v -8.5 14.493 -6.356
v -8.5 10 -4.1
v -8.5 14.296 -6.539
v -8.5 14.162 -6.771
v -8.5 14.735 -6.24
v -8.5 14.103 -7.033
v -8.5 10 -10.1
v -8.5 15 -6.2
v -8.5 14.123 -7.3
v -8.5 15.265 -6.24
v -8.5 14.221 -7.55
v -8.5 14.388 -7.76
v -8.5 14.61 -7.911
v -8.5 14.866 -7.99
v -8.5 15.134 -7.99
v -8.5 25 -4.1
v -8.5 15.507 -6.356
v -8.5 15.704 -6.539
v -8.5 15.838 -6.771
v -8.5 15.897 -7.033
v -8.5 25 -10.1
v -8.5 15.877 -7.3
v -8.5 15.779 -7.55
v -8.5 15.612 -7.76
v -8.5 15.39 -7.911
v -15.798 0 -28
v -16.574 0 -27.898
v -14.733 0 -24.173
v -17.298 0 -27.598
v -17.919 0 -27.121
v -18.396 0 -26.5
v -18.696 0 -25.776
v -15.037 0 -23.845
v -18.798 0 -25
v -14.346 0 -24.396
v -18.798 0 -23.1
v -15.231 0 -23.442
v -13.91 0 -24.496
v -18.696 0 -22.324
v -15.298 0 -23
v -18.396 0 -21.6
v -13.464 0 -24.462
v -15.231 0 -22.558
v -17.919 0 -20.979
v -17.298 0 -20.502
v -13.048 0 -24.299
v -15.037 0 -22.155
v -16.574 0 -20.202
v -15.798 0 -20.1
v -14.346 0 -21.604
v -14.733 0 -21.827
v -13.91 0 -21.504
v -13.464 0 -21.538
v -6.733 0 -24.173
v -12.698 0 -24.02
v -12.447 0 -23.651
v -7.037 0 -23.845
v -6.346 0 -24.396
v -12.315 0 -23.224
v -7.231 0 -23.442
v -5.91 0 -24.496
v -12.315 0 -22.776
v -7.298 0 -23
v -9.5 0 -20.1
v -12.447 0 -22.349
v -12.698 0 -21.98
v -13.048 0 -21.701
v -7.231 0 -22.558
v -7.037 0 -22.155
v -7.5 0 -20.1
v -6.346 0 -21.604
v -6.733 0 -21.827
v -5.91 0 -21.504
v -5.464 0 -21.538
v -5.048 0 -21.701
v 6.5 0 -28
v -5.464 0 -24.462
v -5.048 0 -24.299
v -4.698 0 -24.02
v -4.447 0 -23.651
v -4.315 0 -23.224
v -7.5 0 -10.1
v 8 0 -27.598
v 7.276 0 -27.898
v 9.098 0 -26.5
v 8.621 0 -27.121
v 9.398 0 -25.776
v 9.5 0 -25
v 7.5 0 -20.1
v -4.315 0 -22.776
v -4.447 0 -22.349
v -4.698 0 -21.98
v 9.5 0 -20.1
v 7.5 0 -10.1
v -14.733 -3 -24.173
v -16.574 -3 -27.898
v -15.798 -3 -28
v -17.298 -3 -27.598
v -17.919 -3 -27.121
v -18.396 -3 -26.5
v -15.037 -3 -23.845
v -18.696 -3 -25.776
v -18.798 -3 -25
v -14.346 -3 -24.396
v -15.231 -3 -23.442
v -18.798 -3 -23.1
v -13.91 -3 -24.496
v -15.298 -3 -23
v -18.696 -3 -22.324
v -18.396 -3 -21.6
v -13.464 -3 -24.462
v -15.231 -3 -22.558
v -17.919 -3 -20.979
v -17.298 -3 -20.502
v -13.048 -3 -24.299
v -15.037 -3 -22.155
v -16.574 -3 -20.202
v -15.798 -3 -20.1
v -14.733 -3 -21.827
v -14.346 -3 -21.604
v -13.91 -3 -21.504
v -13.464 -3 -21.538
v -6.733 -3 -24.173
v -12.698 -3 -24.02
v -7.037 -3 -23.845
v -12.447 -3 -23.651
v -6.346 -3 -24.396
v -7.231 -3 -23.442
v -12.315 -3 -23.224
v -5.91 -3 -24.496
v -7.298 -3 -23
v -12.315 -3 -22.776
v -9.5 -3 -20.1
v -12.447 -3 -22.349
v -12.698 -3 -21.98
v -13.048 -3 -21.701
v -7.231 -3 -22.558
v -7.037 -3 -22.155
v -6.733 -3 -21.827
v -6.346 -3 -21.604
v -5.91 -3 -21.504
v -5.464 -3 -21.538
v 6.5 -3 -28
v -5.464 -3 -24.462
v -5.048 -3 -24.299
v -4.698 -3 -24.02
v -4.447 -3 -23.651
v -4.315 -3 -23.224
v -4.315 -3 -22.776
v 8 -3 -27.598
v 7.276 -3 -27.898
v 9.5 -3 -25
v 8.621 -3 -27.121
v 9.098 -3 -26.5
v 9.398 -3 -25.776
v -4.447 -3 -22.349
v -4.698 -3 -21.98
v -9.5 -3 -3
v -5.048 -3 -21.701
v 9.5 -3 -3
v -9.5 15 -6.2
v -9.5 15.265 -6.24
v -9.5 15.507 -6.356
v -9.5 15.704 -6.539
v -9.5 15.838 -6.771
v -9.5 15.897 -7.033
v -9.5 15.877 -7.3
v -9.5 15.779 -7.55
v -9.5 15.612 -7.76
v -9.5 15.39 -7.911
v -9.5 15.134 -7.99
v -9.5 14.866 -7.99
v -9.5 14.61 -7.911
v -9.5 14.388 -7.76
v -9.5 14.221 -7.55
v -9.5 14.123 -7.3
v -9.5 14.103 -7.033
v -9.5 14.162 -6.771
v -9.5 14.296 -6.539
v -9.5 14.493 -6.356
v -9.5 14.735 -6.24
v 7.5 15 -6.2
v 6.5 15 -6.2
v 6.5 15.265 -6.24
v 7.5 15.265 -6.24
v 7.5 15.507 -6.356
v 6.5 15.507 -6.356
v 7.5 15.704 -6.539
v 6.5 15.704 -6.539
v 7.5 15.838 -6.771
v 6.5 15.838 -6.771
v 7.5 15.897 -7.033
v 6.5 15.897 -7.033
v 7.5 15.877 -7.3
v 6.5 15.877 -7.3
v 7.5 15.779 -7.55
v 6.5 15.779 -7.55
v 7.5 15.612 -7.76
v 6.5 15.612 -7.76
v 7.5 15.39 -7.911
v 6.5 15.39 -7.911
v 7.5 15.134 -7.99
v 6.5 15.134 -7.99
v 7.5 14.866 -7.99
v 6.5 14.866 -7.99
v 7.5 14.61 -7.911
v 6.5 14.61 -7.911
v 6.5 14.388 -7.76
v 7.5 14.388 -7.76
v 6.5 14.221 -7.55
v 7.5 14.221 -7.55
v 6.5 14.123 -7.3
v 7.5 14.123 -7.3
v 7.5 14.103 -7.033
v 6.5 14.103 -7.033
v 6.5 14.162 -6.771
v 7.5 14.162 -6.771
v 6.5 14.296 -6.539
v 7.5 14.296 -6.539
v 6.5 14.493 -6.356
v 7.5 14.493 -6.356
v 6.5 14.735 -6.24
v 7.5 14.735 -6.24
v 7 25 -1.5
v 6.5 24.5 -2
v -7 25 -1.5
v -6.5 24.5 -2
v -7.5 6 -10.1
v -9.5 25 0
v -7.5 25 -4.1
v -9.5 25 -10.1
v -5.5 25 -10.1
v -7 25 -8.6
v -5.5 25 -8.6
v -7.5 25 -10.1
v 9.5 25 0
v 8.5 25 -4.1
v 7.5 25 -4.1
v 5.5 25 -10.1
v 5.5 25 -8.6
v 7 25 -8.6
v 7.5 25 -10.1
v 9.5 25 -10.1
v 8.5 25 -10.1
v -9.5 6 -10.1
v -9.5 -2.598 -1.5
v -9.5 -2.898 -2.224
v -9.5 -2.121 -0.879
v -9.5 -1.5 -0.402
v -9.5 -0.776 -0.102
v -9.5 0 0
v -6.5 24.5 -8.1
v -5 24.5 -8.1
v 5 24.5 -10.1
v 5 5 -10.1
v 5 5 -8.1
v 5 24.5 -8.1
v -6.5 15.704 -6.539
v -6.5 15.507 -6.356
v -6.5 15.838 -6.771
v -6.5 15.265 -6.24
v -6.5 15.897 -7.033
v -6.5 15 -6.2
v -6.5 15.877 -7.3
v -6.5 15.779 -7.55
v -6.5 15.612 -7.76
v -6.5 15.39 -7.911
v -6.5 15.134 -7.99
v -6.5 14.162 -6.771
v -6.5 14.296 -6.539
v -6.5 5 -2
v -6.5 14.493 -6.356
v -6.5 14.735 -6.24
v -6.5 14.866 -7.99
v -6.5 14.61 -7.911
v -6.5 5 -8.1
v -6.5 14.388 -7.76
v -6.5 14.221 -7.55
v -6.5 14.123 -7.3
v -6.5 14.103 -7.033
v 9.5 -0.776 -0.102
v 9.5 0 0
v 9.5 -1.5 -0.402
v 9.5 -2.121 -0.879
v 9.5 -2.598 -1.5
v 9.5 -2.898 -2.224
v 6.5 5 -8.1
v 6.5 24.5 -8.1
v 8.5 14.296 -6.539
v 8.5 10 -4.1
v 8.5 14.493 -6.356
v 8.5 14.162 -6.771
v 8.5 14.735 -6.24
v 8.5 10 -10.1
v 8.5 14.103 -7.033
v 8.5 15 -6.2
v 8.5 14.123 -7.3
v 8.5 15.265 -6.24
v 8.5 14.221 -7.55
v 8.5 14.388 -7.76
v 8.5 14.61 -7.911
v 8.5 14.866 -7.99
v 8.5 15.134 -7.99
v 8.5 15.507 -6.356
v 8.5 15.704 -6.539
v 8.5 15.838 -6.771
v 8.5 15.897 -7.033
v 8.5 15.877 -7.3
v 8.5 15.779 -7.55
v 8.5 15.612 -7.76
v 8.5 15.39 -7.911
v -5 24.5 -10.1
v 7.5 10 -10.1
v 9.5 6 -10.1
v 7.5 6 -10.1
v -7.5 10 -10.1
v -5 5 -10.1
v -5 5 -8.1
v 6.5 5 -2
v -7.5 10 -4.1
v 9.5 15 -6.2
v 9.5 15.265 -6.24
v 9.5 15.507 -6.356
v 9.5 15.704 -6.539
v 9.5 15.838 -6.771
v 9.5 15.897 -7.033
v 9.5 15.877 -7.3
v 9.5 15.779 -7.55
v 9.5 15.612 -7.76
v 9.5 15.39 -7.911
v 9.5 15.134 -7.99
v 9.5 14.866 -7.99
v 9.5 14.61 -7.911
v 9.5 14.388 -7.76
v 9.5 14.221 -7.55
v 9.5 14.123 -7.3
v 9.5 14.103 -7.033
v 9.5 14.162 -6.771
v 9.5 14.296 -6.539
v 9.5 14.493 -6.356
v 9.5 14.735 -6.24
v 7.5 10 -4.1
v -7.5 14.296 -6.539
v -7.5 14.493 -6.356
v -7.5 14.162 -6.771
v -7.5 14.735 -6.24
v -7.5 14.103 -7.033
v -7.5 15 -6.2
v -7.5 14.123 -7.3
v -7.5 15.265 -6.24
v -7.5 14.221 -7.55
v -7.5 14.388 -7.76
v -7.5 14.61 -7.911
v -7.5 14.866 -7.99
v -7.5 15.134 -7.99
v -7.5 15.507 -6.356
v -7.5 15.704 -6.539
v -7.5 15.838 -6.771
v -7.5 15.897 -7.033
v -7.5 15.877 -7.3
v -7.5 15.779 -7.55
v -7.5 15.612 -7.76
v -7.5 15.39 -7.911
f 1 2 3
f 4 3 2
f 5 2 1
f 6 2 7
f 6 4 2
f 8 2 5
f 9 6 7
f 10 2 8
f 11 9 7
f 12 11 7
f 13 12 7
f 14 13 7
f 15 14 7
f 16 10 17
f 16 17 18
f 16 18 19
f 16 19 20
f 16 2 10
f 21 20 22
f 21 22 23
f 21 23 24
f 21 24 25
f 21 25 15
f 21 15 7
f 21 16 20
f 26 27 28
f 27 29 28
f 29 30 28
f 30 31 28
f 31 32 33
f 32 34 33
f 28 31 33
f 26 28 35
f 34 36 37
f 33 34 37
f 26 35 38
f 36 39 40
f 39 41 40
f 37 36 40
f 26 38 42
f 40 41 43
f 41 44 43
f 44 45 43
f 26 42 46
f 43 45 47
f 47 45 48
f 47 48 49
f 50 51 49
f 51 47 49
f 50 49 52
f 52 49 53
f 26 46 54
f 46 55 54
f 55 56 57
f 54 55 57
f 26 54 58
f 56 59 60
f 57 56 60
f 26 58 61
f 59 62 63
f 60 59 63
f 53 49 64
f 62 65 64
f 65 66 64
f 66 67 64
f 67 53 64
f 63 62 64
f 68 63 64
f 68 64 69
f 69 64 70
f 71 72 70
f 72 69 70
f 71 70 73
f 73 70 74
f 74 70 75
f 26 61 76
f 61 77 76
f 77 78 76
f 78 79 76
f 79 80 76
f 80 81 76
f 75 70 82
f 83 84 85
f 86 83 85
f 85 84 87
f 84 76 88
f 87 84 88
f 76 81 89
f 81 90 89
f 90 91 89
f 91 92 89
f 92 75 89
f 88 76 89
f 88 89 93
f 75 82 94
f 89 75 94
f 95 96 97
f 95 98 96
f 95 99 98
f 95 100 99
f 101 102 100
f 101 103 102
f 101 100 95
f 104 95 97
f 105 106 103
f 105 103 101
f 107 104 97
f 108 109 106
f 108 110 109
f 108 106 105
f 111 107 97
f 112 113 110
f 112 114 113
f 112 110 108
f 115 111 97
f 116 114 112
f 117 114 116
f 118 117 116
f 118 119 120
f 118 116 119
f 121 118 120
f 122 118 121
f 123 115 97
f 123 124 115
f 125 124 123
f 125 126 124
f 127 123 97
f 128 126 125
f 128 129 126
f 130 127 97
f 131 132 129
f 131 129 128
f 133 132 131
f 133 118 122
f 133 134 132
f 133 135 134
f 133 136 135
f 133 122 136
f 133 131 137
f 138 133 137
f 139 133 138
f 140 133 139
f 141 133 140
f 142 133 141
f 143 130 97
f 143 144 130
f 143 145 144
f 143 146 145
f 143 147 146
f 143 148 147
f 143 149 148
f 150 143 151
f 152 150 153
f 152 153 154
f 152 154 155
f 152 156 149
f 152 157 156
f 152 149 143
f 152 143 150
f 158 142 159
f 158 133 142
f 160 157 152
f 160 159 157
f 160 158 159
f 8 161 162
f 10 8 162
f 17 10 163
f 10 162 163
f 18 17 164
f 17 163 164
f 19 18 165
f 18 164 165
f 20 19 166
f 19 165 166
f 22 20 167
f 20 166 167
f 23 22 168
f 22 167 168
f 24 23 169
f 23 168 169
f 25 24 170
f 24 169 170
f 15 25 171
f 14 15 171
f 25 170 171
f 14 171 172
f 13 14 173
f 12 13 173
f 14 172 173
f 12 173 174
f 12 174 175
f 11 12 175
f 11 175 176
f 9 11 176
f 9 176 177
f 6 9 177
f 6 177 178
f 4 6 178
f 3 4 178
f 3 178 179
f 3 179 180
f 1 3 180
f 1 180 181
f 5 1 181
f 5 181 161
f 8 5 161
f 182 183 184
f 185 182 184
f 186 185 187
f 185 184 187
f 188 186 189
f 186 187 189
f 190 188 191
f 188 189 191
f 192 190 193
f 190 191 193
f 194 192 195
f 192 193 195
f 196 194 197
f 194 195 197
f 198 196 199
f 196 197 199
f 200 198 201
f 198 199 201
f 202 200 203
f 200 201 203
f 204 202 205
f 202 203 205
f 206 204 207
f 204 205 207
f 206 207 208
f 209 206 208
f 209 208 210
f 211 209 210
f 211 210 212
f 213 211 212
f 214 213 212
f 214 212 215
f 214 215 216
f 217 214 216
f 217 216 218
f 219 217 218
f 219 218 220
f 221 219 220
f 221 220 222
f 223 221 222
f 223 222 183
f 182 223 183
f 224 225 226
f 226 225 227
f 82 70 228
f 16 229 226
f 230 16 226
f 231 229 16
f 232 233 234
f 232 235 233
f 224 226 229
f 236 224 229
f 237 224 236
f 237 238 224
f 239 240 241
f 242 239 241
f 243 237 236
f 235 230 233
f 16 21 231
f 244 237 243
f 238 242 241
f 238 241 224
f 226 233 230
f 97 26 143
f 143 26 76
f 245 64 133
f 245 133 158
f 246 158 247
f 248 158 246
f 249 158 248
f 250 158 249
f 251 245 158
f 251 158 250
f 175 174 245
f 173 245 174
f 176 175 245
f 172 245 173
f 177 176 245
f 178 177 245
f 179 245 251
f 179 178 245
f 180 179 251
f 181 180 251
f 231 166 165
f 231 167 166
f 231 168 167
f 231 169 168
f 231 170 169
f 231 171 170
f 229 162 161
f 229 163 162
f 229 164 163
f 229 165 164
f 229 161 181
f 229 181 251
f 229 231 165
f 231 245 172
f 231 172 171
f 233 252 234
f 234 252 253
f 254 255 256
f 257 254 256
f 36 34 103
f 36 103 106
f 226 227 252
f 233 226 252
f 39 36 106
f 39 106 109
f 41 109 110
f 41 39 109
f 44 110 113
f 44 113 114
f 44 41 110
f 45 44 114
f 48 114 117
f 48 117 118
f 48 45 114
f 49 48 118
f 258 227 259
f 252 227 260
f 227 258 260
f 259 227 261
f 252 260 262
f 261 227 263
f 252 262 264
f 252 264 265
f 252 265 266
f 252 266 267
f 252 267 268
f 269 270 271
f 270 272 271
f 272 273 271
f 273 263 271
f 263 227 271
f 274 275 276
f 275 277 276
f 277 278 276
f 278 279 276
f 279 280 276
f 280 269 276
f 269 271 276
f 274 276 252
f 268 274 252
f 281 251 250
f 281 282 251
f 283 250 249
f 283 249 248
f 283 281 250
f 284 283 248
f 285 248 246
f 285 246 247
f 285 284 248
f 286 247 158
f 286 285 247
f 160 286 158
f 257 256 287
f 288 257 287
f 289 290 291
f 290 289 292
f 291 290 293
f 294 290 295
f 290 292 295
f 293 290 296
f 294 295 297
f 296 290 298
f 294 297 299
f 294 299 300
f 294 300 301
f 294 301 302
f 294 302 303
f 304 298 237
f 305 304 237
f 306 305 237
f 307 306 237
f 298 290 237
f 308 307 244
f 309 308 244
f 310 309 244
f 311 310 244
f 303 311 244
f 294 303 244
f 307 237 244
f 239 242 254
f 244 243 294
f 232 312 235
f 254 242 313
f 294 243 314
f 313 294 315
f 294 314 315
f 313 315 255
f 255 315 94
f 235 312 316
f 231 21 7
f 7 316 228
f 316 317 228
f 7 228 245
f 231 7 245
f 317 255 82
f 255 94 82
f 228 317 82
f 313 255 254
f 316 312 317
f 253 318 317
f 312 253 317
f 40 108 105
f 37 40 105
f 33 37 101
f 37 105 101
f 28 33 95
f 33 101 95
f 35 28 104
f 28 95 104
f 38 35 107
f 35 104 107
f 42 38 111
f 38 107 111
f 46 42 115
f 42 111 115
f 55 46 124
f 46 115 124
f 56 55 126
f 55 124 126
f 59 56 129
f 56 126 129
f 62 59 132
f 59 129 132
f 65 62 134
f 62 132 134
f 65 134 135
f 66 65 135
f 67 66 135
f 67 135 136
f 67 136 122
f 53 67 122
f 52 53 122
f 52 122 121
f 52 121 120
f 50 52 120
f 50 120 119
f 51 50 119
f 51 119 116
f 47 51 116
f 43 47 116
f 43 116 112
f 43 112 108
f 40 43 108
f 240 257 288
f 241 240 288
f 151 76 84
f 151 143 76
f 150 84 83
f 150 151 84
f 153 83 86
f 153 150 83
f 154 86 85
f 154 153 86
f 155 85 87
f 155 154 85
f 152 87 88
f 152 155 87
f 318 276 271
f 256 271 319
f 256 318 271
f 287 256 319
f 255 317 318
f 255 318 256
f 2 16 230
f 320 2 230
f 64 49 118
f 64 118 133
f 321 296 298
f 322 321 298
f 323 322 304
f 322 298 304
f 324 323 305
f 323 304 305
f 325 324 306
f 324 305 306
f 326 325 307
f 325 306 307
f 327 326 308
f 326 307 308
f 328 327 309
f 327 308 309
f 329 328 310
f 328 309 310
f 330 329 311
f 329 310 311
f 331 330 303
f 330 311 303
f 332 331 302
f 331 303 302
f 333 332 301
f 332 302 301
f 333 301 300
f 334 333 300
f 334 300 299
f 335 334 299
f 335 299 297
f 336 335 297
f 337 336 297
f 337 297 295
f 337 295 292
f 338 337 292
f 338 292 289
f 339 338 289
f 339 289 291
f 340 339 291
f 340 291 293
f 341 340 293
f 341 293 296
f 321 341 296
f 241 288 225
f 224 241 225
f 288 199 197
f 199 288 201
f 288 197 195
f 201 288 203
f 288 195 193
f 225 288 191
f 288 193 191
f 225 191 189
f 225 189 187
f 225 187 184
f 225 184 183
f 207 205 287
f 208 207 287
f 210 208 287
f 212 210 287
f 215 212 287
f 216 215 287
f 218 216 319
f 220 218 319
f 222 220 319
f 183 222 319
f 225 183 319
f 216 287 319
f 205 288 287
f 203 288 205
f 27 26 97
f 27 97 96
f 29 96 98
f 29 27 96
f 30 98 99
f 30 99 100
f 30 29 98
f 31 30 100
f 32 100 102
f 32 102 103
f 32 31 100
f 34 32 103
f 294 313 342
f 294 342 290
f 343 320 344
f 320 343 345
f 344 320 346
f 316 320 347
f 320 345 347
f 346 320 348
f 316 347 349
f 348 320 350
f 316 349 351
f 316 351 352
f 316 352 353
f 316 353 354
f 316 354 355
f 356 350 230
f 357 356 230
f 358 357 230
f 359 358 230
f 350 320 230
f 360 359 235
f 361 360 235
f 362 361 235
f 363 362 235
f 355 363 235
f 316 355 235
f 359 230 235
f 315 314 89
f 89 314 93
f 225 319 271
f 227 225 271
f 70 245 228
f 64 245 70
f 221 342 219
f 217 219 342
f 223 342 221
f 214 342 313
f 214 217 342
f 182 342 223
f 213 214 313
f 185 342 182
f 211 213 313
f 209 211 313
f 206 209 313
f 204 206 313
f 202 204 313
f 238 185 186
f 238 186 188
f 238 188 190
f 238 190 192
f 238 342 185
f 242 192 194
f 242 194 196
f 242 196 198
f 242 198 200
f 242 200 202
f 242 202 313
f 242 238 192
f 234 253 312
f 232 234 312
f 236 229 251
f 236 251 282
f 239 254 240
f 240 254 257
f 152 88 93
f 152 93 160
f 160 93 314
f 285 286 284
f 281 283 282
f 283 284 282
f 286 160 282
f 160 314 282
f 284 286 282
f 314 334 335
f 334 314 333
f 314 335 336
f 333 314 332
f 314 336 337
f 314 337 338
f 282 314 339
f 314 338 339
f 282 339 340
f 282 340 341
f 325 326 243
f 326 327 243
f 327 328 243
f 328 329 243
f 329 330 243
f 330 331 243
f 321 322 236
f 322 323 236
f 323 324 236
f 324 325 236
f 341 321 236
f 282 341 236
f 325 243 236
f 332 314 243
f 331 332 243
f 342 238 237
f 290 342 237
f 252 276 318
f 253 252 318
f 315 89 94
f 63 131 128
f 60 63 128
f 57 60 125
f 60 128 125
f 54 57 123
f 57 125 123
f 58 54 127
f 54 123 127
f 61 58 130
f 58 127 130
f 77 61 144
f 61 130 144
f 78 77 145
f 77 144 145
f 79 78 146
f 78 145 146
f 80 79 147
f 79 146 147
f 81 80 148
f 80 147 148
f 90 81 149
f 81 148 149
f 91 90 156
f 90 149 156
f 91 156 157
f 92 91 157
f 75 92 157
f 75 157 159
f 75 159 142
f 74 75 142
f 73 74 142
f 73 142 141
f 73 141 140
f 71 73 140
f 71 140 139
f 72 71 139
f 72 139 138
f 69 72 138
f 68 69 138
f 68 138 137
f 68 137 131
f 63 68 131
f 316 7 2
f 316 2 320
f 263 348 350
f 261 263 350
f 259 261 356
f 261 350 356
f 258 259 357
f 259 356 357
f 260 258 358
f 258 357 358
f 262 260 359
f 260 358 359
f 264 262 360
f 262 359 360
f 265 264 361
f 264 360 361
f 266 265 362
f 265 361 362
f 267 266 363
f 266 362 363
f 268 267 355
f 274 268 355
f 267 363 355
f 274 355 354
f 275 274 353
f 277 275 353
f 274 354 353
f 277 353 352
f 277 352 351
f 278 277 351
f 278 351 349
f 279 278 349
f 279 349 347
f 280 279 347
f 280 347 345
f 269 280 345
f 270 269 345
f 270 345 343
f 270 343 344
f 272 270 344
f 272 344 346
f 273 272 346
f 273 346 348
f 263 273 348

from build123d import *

# Parameters (mm, degrees)
EXTRUDE_1_DEPTH           = 25
SKETCH_2_W                = 19
SKETCH_2_H                = 28
SKETCH_2_R                = 1.5
EXTRUDE_2_DEPTH           = 3
SKETCH_3_W                = 1
SKETCH_3_H                = 6
CUT_EXTRUDE_1_DEPTH       = 15
SKETCH_4_R                = 0.9
CUT_EXTRUDE_2_DEPTH       = 19
FILLET_1_R                = 3
EXTRUDE_3_DEPTH           = 2
EXTRUDE_4_DEPTH           = 5
FILLET_2_R                = 3
CHAMFER_1_SIZE            = 0.5
EXTRUDE_5_DEPTH           = 3
HOLE_WIZARD_3_0_3_1_D     = 3
HOLE_WIZARD_3_0_3_1_DEPTH = 3


with BuildPart() as part:
    # 草图1 → 凸台-拉伸1 (new body)
    with BuildSketch(Plane(origin=(0, 0, 0), x_dir=(1, 0, 0), z_dir=(0, 1, 0))):
        Polygon((-9.5, 10.1), (-9.5, 0), (9.5, 0), (9.5, 10.1), (5, 10.1), (5, 8.1), (6.5, 8.1), (6.5, 2), (-6.5, 2), (-6.5, 8.1), (-5, 8.1), (-5, 10.1), align=None)
    extrude(amount=EXTRUDE_1_DEPTH)

    # 草图2 → 凸台-拉伸2 (add)
    with BuildSketch(Plane.XZ):
        with Locations((0, -14)):
            Rectangle(SKETCH_2_W, SKETCH_2_H)
        with Locations((4, -25)):
            Circle(SKETCH_2_R, mode=Mode.SUBTRACT)
        with Locations((-4, -25)):
            Circle(SKETCH_2_R, mode=Mode.SUBTRACT)
    extrude(amount=EXTRUDE_2_DEPTH)

    # 草图3 → 切除-拉伸1 (cut)
    with BuildSketch(Plane(origin=(0, 25, 0), x_dir=(1, 0, 0), z_dir=(0, 1, 0))):
        with Locations((-8, 7.1)):
            Rectangle(SKETCH_3_W, SKETCH_3_H)
        with Locations((8, 7.1)):
            Rectangle(SKETCH_3_W, SKETCH_3_H)
    extrude(amount=-CUT_EXTRUDE_1_DEPTH, mode=Mode.SUBTRACT)

    # 草图4 → 切除-拉伸2 (cut)
    with BuildSketch(Plane.ZY.offset(9.5)):
        with Locations((-7.1, 15)):
            Circle(SKETCH_4_R)
    extrude(amount=-CUT_EXTRUDE_2_DEPTH, mode=Mode.SUBTRACT)

    # 圆角1
    fillet_1_edges = [part.edges().sort_by_distance(p)[0] for p in [
        (9.5, -1.5, -28),
        (-9.5, -1.5, -28),
    ]]
    fillet(fillet_1_edges, radius=FILLET_1_R)

    # 草图5 → 凸台-拉伸3 (add)
    with BuildSketch(Plane.ZY.offset(9.5)):
        Polygon((-10.1, 0), (-10.1, 6), (-20.1, 0), align=None)
    extrude_3 = extrude(amount=-EXTRUDE_3_DEPTH)

    # 镜向1: 凸台-拉伸3 across plane
    add(extrude_3.mirror(Plane(origin=(0, 0, 0), x_dir=(0, 0, 1), z_dir=(1, 0, 0))))

    # 草图6 → 凸台-拉伸4 (add)
    with BuildSketch(Plane(origin=(0, 0, 0), x_dir=(1, 0, 0), z_dir=(0, 1, 0))):
        Polygon((-6.5, 2), (6.5, 2), (6.5, 8.1), (5, 8.1), (5, 10.1), (-5, 10.1), (-5, 8.1), (-6.5, 8.1), align=None)
    extrude(amount=EXTRUDE_4_DEPTH)

    # 圆角2
    fillet_2_edges = [part.edges().sort_by_distance(p)[0] for p in [
        (0, -3, 0),
    ]]
    fillet(fillet_2_edges, radius=FILLET_2_R)

    # 倒角1
    chamfer_1_edges = [part.edges().sort_by_distance(p)[0] for p in [
        (5, 25, -9.1),
        (5.75, 25, -8.1),
        (6.5, 25, -5.05),
        (0, 25, -2),
        (-6.5, 25, -5.05),
        (-5.75, 25, -8.1),
        (-5, 25, -9.1),
    ]]
    chamfer(chamfer_1_edges, length=CHAMFER_1_SIZE)

    # 草图7 → 凸台-拉伸5 (add)
    with BuildSketch(Plane(origin=(0, 0, 0), x_dir=(1, 0, 0), z_dir=(0, 1, 0))):
        with BuildLine():
            Line((6.5, 28), (-15.797958971, 28))
            ThreePointArc((-15.797958971, 28), (-17.919279315, 27.121320344), (-18.797958971, 25))
            Line((-18.797958971, 25), (-18.797958971, 23.1))
            ThreePointArc((-18.797958971, 23.1), (-17.919279315, 20.978679656), (-15.797958971, 20.1))
            Line((-15.797958971, 20.1), (6.5, 20.1))
            Line((6.5, 20.1), (6.5, 28))
        make_face()
    extrude(amount=-EXTRUDE_5_DEPTH)

    # Ø3.0 (3) 直径孔1
    with Locations(Plane(origin=(0, 0, 0), x_dir=(1, 0, 0), z_dir=(0, 1, 0))):
        with Locations((-5.797958971, 23), (-13.797958971, 23)):
            Hole(HOLE_WIZARD_3_0_3_1_D / 2, depth=HOLE_WIZARD_3_0_3_1_DEPTH)


solid = part.part
